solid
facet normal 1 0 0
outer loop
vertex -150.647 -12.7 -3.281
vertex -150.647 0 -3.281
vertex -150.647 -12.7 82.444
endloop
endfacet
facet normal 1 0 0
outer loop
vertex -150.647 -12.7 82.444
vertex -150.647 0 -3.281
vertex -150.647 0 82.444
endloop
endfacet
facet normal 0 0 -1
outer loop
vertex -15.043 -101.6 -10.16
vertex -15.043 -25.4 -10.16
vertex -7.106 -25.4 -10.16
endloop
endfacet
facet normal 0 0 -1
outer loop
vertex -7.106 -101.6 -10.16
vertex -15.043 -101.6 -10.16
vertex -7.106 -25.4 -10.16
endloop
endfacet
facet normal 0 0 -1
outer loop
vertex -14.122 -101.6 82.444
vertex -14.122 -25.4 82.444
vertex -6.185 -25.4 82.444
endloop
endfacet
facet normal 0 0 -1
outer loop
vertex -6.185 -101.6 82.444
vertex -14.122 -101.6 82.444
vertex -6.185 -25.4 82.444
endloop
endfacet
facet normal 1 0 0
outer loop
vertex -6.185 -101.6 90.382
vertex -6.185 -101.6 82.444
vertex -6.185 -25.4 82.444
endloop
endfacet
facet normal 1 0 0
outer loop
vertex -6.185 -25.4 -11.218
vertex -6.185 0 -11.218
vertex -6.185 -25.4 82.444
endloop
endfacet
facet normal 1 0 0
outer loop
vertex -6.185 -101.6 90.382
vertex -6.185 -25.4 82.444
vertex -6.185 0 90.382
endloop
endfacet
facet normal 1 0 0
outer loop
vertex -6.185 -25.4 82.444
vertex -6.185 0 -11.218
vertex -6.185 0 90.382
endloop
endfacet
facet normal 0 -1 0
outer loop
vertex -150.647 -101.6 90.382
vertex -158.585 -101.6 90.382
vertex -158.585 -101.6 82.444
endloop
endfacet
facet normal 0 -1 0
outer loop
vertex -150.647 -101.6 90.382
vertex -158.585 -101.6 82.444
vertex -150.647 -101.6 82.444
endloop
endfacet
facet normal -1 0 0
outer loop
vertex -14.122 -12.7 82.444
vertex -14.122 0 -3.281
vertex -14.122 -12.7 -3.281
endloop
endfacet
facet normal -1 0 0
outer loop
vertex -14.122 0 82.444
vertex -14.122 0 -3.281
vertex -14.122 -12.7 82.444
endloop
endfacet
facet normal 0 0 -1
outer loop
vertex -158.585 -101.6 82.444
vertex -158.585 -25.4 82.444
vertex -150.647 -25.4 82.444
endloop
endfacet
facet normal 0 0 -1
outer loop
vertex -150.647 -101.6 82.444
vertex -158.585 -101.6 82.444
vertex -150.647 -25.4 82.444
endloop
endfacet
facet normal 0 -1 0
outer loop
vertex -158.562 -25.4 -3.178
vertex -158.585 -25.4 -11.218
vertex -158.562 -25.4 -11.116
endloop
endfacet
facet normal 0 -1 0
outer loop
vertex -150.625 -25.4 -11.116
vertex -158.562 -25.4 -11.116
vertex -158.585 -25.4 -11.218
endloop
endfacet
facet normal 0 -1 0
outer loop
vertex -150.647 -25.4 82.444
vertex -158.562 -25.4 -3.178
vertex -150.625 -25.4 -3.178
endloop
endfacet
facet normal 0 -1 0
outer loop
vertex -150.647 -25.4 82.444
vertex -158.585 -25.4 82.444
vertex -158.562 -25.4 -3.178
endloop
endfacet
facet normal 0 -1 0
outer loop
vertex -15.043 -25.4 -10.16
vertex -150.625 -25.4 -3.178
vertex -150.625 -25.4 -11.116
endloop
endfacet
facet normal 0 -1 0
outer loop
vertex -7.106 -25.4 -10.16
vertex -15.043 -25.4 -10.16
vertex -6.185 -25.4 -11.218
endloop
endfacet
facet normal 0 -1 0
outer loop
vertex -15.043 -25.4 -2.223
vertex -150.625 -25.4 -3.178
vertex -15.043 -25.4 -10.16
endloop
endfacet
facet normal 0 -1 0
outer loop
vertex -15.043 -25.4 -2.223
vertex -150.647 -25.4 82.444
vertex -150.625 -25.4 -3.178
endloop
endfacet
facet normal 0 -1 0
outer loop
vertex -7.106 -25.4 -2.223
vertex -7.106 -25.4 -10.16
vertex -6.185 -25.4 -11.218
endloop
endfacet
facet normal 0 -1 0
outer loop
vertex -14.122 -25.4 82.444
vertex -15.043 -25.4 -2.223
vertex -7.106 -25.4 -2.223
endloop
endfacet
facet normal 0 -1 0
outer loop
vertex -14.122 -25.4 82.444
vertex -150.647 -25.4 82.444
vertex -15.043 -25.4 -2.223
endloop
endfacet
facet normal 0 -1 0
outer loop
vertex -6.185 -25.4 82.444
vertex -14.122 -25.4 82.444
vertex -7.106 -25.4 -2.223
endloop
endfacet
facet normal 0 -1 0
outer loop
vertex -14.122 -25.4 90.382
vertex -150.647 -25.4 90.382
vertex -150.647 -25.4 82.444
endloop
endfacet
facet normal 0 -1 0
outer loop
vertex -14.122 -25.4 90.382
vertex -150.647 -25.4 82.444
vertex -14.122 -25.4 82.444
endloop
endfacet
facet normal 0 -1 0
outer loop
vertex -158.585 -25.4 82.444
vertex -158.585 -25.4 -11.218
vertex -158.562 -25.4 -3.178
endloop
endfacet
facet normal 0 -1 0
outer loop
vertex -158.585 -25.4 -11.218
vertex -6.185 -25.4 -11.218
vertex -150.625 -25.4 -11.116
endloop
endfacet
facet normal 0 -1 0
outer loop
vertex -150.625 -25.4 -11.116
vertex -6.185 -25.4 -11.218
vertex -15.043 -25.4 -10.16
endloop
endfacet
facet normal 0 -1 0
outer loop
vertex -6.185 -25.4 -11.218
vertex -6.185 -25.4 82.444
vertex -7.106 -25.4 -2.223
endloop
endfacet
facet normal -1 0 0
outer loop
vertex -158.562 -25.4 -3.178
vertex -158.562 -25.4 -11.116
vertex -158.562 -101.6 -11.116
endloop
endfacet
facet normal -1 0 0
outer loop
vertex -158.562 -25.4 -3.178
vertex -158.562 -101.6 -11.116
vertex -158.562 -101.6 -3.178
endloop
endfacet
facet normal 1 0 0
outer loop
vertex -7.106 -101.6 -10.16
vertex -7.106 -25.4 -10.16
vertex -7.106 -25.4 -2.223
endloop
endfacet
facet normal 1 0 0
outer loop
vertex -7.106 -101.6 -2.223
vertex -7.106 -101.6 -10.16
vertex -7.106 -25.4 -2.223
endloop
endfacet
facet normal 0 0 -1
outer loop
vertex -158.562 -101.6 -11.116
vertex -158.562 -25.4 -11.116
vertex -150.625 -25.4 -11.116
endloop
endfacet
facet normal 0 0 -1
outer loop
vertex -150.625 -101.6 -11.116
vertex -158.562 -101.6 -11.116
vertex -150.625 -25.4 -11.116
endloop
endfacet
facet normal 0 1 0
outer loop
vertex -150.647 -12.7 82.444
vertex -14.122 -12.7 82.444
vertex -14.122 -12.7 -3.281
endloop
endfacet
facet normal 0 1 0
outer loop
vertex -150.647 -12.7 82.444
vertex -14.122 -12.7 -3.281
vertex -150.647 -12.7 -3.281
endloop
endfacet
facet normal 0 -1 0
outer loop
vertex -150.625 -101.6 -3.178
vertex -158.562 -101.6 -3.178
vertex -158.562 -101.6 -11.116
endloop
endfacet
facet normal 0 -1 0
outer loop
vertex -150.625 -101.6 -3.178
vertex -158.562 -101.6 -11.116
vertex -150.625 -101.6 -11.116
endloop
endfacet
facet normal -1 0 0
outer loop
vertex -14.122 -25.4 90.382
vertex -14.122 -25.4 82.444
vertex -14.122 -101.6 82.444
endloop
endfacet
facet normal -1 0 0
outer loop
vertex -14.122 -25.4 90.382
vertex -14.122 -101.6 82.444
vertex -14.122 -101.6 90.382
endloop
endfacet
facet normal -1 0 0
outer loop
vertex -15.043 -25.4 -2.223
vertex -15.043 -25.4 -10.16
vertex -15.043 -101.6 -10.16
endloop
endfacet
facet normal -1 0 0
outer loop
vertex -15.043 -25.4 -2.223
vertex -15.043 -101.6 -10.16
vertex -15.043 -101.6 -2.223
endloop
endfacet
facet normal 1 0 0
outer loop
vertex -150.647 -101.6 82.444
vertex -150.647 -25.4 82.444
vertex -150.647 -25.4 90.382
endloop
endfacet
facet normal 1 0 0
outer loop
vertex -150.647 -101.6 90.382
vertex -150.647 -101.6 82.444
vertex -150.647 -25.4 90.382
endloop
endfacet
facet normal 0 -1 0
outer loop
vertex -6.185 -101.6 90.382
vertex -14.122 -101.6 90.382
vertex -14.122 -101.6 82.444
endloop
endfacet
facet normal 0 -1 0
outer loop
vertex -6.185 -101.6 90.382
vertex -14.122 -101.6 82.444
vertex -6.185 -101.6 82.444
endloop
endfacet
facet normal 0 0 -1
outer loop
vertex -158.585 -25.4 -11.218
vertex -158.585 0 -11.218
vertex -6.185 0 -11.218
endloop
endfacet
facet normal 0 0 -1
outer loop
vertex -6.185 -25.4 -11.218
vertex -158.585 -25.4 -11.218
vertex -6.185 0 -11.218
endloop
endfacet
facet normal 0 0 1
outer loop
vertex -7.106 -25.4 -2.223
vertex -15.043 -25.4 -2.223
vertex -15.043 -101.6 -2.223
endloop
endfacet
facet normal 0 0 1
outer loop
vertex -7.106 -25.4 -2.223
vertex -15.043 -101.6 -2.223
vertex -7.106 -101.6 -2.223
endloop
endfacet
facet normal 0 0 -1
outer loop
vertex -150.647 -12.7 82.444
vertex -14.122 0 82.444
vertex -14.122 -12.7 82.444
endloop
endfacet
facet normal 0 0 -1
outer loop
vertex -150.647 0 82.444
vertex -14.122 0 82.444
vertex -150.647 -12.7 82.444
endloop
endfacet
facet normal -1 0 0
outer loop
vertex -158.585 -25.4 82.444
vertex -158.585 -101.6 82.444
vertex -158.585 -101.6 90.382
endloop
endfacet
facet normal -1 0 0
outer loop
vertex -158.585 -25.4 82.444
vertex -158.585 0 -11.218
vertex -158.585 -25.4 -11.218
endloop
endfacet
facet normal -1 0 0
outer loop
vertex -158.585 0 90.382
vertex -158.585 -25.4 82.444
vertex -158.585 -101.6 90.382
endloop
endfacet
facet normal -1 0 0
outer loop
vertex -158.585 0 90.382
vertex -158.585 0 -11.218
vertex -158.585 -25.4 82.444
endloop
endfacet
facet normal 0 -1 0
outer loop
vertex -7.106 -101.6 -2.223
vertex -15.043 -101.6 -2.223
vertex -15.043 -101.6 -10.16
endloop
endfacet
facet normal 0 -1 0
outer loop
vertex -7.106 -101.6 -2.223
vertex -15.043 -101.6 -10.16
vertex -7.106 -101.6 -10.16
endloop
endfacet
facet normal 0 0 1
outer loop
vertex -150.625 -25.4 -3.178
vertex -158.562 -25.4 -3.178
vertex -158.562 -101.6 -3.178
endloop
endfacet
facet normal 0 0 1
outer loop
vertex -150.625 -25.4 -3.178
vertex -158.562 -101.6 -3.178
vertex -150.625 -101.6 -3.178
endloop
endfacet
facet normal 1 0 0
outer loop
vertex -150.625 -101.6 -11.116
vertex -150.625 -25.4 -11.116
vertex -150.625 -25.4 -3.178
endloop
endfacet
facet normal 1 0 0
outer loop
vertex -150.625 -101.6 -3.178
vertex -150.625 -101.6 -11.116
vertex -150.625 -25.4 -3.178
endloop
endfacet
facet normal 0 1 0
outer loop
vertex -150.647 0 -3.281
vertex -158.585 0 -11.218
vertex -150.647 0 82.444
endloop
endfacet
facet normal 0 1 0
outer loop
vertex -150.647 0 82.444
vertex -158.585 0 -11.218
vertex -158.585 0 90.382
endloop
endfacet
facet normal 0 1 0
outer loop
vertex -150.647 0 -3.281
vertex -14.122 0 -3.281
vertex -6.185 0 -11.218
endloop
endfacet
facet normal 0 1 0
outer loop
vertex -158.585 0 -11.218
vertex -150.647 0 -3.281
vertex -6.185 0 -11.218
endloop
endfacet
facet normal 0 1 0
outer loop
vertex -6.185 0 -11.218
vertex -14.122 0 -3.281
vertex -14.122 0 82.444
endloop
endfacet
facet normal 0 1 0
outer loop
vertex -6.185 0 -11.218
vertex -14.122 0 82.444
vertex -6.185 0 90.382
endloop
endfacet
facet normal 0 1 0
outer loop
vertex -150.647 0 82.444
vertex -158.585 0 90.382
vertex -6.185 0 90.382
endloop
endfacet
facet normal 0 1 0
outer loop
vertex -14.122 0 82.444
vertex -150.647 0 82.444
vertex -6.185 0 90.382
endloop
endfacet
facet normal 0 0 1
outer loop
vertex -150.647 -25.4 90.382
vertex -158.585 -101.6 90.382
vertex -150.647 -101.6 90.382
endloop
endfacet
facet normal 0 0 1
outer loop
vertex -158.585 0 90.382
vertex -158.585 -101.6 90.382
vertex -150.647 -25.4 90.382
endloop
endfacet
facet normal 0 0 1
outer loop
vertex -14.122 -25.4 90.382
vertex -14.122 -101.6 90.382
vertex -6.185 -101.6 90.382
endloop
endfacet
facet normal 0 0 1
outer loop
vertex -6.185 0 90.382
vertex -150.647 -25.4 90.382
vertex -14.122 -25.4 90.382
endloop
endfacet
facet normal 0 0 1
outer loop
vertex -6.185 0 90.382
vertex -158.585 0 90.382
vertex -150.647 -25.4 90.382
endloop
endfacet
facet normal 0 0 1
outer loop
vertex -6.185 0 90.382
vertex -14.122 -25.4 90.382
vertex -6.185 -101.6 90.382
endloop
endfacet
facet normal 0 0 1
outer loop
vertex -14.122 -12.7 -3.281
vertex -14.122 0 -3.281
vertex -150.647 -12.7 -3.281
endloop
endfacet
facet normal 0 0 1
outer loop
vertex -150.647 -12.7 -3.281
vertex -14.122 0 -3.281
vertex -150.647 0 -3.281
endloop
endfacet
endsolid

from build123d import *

# Parameters (mm, degrees)
F0_W      = 152.4
F0_H      = 101.6
F1_DEPTH  = 25.4
F2_W      = 7.9375
F2_H      = 7.9375
F3_DEPTH  = 76.2
F4_W      = 7.9375
F4_H      = 7.9375
F7_DEPTH  = 76.2
F5_W      = 7.9375
F5_H      = 7.9375
F8_DEPTH  = 76.2
F6_W      = 7.9375
F6_H      = 7.9375
F9_DEPTH  = 76.2
F10_W     = 136.525
F10_H     = 85.725
F11_DEPTH = 12.7


# Not quite as in the source:
# - a length typed as a fraction of an inch, garbled in the dataset ("3 / 203.2 mm" for 3/8 in), is restored


with BuildPart() as f1:
    # F0 (on Front) → F1 (new body)
    with BuildSketch(Plane.XZ):
        with Locations((-82.3848899454, 39.5816343878)):
            Rectangle(F0_W, F0_H)
    extrude(amount=F1_DEPTH)

    # F2 (on face) → F3 (join)
    with BuildSketch(Plane.XZ.offset(25.4)):
        with Locations((-154.6161399454, 86.4128843878)):
            Rectangle(F2_W, F2_H)
    extrude(amount=F3_DEPTH)

    # F4 (on face) → F7 (join)
    with BuildSketch(Plane.XZ.offset(25.4)):
        with Locations((-10.1536399454, 86.4128843878)):
            Rectangle(F4_W, F4_H)
    extrude(amount=F7_DEPTH)

    # F5 (on face) → F8 (join)
    with BuildSketch(Plane.XZ.offset(25.4)):
        with Locations((-154.5934006572, -7.1469780084)):
            Rectangle(F5_W, F5_H)
    extrude(amount=F8_DEPTH)

    # F6 (on face) → F9 (join)
    with BuildSketch(Plane.XZ.offset(25.4)):
        with Locations((-11.0744582489, -6.1915257747)):
            Rectangle(F6_W, F6_H)
    extrude(amount=F9_DEPTH)

    # F10 (on face) → F11 (cut)
    with BuildSketch(Plane(origin=(0, 0, 0), x_dir=(-1, 0, 0), z_dir=(0, 1, 0))):
        with Locations((82.3848899454, 39.5816343878)):
            Rectangle(F10_W, F10_H)
    extrude(amount=-F11_DEPTH, mode=Mode.SUBTRACT)


solid = f1.part
